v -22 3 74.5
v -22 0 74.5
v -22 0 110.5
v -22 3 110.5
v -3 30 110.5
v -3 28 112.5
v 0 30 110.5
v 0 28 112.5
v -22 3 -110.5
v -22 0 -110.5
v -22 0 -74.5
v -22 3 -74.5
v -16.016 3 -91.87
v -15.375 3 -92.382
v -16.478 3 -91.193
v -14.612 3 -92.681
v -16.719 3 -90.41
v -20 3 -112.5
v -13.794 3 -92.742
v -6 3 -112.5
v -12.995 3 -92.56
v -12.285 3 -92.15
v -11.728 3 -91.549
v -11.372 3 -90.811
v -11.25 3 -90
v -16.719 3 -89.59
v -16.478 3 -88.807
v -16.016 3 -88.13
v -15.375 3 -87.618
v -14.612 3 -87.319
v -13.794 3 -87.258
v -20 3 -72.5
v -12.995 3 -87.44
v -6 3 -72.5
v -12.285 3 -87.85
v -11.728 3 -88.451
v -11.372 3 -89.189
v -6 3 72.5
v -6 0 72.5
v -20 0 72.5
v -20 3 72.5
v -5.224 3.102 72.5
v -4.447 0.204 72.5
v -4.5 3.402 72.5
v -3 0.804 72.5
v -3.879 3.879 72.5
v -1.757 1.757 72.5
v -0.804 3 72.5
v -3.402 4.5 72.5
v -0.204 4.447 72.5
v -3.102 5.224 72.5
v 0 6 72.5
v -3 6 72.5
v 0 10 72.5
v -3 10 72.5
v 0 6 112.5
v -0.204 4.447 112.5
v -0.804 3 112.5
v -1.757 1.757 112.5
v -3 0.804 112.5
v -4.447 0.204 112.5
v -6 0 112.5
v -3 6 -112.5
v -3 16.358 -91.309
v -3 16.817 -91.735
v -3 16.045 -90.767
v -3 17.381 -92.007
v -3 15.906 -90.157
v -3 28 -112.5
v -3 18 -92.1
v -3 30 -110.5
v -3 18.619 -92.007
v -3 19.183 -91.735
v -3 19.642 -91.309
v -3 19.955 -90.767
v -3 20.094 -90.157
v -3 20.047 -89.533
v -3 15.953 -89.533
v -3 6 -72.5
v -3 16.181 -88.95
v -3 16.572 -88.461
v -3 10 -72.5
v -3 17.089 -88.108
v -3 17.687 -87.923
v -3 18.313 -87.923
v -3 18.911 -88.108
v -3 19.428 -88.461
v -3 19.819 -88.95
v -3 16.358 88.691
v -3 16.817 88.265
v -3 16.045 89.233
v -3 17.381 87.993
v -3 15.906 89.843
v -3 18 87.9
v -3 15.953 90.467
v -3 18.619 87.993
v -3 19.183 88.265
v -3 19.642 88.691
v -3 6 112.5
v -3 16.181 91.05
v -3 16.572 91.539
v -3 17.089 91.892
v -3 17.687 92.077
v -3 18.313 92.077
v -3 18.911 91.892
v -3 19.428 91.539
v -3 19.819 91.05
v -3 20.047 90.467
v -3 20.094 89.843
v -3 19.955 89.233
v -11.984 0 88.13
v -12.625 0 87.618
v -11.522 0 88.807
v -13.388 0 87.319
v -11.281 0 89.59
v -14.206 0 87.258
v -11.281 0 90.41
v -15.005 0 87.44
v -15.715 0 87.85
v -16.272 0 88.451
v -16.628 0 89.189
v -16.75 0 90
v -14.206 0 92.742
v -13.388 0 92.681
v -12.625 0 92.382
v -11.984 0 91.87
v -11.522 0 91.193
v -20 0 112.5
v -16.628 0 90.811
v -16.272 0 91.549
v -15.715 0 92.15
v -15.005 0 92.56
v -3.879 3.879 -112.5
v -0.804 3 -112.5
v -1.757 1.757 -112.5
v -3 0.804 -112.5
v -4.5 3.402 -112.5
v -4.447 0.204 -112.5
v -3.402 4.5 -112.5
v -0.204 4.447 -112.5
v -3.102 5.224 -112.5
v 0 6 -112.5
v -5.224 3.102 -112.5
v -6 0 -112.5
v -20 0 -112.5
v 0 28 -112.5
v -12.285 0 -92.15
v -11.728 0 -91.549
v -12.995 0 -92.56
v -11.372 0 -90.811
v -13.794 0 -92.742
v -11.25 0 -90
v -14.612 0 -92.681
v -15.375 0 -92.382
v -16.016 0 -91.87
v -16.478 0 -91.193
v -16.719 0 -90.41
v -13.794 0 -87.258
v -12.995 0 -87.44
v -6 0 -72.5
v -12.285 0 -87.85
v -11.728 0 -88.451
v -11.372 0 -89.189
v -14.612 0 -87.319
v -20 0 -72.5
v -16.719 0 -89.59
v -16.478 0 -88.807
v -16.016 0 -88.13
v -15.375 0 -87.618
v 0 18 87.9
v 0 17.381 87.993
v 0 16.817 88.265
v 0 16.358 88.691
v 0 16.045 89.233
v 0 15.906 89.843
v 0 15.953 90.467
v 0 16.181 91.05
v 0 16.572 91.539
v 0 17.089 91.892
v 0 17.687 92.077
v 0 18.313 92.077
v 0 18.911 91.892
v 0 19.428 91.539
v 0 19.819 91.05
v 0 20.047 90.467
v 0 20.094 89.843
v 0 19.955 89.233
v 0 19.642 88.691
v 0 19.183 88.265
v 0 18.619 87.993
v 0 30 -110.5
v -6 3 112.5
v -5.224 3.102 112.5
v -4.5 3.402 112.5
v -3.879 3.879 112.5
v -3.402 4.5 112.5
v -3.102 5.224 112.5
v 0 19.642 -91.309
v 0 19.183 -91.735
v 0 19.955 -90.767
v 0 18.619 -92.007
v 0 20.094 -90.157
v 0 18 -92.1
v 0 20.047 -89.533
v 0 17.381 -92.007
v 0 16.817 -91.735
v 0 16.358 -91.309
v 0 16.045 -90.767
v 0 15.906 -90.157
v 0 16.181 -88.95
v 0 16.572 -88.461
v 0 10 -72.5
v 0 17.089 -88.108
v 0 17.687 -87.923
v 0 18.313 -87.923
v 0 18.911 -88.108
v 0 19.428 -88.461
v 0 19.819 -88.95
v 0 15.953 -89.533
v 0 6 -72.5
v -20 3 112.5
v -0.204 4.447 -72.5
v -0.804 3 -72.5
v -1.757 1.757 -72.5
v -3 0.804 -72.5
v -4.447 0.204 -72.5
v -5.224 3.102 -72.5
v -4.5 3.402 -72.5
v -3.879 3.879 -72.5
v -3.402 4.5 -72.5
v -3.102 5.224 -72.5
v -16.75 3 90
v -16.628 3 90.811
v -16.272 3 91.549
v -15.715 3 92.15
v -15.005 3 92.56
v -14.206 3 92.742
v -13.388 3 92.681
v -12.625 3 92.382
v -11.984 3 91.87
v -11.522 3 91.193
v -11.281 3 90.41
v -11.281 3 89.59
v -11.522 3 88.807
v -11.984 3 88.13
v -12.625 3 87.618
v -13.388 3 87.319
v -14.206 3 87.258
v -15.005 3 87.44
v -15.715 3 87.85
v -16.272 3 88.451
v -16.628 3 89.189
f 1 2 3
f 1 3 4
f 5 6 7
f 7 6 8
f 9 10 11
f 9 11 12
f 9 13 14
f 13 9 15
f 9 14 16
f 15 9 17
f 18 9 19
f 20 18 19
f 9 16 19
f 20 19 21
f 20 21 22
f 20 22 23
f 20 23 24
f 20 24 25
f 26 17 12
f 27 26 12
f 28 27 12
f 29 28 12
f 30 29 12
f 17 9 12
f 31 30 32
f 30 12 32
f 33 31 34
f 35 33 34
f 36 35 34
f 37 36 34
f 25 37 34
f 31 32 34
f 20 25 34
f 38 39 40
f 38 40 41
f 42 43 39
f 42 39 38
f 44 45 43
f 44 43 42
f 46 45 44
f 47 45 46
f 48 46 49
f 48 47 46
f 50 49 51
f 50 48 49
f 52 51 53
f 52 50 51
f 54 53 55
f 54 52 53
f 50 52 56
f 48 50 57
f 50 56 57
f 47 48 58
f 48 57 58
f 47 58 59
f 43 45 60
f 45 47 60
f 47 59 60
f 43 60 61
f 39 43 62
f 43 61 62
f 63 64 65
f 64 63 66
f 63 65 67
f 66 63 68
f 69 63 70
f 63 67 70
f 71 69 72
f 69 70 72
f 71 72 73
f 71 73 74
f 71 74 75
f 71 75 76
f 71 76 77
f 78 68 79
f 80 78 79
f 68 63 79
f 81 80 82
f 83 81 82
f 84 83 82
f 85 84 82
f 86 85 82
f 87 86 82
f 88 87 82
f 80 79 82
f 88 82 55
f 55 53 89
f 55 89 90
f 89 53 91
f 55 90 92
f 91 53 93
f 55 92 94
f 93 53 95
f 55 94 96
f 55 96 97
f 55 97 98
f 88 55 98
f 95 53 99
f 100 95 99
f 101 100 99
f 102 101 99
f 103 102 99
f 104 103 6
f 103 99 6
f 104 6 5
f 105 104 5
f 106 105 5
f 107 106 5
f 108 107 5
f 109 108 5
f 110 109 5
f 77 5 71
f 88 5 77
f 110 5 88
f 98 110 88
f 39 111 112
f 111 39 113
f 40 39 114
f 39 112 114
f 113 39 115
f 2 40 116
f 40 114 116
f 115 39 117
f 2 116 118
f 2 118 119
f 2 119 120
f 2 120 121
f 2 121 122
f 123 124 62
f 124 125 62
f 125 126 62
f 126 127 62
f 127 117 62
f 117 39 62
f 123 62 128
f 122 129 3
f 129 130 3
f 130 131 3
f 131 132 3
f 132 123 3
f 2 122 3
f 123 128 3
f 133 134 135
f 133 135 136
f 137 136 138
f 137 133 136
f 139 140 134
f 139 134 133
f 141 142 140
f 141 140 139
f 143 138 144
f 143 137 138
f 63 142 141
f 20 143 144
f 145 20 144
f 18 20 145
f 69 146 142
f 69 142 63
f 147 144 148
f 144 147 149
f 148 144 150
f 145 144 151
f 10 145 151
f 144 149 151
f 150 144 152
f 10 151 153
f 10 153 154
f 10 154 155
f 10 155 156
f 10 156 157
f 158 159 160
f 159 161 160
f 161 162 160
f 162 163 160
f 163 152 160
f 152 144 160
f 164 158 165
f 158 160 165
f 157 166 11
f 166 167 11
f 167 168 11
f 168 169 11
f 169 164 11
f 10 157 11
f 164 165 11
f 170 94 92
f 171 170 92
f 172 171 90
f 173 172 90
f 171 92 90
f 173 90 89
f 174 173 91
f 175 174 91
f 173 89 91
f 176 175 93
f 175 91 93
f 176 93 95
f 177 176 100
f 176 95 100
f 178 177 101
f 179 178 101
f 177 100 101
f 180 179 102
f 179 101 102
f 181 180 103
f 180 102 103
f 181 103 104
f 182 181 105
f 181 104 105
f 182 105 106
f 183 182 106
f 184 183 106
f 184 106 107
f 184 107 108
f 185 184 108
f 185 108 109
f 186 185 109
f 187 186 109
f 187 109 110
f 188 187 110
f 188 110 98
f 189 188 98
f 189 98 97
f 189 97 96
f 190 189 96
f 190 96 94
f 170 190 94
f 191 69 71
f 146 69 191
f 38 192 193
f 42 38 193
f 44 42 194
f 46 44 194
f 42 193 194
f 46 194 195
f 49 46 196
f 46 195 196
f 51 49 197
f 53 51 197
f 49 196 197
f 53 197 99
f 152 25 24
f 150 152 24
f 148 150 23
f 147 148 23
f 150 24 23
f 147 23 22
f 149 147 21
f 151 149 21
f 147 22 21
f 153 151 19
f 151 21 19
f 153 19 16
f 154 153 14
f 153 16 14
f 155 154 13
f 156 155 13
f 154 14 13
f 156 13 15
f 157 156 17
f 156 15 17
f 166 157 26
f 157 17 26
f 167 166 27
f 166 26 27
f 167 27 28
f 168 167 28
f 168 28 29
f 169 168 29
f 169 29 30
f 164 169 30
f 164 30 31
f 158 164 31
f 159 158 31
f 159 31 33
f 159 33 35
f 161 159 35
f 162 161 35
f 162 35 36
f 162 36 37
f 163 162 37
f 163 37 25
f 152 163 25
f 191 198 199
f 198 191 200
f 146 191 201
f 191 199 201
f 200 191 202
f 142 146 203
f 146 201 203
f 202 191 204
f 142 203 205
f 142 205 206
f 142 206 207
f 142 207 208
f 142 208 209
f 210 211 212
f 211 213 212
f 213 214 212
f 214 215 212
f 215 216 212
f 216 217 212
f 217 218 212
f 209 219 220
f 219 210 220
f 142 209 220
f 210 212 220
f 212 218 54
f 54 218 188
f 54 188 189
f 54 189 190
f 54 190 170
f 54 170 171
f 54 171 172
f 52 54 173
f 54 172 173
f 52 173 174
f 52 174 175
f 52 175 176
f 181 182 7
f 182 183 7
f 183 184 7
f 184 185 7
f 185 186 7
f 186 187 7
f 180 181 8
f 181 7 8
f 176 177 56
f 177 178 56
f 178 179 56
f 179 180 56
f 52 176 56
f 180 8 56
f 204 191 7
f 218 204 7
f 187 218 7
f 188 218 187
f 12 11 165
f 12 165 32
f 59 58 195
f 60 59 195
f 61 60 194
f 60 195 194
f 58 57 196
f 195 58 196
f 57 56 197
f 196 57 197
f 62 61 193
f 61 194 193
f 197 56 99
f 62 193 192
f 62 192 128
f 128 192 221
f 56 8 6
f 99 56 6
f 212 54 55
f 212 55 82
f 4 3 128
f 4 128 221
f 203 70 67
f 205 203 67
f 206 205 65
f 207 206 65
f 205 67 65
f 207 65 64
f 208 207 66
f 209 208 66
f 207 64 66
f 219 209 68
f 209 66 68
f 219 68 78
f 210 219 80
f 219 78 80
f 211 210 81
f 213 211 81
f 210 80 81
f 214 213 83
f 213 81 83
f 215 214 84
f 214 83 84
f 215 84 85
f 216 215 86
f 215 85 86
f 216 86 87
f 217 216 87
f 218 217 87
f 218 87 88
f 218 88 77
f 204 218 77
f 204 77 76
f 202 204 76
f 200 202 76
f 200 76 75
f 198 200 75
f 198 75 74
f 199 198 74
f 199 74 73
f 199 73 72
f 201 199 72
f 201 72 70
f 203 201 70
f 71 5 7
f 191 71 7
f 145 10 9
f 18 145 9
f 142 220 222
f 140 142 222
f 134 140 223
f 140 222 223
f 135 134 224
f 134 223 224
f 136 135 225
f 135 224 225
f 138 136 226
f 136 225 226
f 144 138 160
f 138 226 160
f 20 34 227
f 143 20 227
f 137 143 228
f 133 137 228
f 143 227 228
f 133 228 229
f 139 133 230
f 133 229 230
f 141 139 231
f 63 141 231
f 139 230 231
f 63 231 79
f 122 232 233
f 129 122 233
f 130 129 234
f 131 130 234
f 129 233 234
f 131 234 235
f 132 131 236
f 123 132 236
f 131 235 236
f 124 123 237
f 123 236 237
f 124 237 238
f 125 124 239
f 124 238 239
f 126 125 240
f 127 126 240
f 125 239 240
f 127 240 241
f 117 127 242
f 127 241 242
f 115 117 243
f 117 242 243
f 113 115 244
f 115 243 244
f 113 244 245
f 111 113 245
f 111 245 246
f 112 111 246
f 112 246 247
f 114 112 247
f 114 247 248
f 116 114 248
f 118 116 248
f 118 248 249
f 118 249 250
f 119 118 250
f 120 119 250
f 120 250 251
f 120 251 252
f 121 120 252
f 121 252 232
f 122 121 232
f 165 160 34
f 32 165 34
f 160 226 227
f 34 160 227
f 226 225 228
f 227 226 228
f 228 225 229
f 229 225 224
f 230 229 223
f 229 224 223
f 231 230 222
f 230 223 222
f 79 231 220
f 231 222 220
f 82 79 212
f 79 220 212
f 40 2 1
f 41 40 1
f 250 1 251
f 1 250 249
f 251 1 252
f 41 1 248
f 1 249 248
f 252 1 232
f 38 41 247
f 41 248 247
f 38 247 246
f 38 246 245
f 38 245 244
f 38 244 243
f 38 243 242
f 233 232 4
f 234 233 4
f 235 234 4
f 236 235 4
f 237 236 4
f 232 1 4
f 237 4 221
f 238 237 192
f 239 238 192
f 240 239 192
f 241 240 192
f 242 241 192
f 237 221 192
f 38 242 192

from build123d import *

# Parameters (mm, degrees)
BASE_FLANGE1_DEPTH    = 112.5
SKETCH4_R             = 2.75
CUT_EXTRUDE1_DEPTH    = 10
SKETCH5_W             = 145
SKETCH5_H             = 10
CUT_EXTRUDE2_DEPTH    = 70
CHAMFER1_SIZE         = 2
M5_TAPPED_HOLE1_D     = 4.2
M5_TAPPED_HOLE1_DEPTH = 12.4
M5_TAPPED_HOLE1_TIP   = 1.2618073


# Sheet-metal steps are written as plain solids
with BuildPart() as part:
    # Sketch1 → Base-Flange1 (new, symmetric)
    with BuildSketch(Plane.XY):
        with BuildLine():
            Line((0, 30), (0, 6))
            ThreePointArc((0, 6), (-1.757359313, 1.757359313), (-6, 0))
            Line((-6, 0), (-22, 0))
            Line((-22, 0), (-22, 3))
            Line((-22, 3), (-6, 3))
            ThreePointArc((-6, 3), (-3.878679656, 3.878679656), (-3, 6))
            Line((-3, 6), (-3, 30))
            Line((-3, 30), (0, 30))
        make_face()
    extrude(amount=BASE_FLANGE1_DEPTH, both=True)

    # Sketch4 → Cut-Extrude1 (cut)
    with BuildSketch(Plane(origin=(0, 3, 0), x_dir=(1, 0, 0), z_dir=(0, 1, 0))):
        with Locations(Location((-14, -90, 0), (0, 0, 180))):
            Circle(SKETCH4_R)
        with Locations((-14, 90)):
            Circle(SKETCH4_R)
    extrude(amount=-CUT_EXTRUDE1_DEPTH, mode=Mode.SUBTRACT)

    # Sketch5 → Cut-Extrude2 (cut)
    with BuildSketch(Plane(origin=(0, 0, 0), x_dir=(0, 0, -1), z_dir=(1, 0, 0))):
        with Locations((0, 5)):
            Rectangle(SKETCH5_W, SKETCH5_H)
    extrude(amount=-CUT_EXTRUDE2_DEPTH, mode=Mode.SUBTRACT)

    # Chamfer1
    chamfer1_edges = [part.edges().sort_by_distance(p)[0] for p in [
        (-1.5, 30, 112.5),
        (-22, 1.5, 72.5),
        (-22, 1.5, -72.5),
        (-22, 1.5, 112.5),
        (-1.5, 30, -112.5),
        (-22, 1.5, -112.5),
    ]]
    chamfer(chamfer1_edges, length=CHAMFER1_SIZE)

    # M5 Tapped Hole1
    with Locations(Plane(origin=(0, 18, 90), x_dir=(0, 0, 1), z_dir=(1, 0, 0))):
        with Locations((0, 0), (-180, 0)):
            Hole(M5_TAPPED_HOLE1_D / 2, depth=M5_TAPPED_HOLE1_DEPTH)
            with Locations((0, 0, -(M5_TAPPED_HOLE1_DEPTH + M5_TAPPED_HOLE1_TIP / 2))):  # 118° drill point
                Cone(0, M5_TAPPED_HOLE1_D / 2, M5_TAPPED_HOLE1_TIP, mode=Mode.SUBTRACT)


solid = part.part
